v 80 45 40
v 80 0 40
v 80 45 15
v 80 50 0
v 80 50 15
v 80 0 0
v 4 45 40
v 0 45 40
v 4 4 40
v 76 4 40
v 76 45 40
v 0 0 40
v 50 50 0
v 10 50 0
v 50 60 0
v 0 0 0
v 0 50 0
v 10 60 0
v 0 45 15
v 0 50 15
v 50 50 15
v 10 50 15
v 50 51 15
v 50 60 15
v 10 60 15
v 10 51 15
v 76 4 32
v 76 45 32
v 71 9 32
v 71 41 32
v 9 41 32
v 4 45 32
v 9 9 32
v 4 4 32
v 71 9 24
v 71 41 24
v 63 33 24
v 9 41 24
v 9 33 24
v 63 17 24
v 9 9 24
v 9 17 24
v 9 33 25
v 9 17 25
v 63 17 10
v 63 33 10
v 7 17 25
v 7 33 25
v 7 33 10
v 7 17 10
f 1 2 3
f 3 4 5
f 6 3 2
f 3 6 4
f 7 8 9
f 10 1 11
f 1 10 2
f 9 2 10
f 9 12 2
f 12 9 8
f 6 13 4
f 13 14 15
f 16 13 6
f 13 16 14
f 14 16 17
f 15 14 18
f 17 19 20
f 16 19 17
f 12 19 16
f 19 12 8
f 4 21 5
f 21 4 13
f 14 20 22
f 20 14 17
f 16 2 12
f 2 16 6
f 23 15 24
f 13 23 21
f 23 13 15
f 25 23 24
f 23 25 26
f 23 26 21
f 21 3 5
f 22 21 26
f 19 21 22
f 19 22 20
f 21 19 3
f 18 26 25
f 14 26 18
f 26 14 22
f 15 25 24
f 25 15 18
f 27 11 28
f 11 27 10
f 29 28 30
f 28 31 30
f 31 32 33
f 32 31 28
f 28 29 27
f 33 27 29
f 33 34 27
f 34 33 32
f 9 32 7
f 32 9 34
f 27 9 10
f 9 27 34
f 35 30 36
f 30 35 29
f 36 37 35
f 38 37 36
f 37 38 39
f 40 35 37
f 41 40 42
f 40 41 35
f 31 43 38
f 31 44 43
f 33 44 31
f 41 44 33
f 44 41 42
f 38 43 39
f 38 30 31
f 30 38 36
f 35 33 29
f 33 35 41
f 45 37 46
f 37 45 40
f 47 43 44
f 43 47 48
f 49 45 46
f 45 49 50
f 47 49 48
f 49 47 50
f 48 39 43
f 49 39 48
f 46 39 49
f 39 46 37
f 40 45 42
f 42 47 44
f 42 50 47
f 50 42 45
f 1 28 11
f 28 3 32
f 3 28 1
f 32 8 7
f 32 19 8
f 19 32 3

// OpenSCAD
// ============================================================
// Stepped-Cavity Housing with Side Projection
// ============================================================

// ---- Global resolution ----
$fn = 64;

// ---- Main body dimensions (mm) ----
body_length   = 80;   // X size
body_width    = 50;   // Y size
body_height   = 40;   // Z size

// ---- Upper recess (broad pocket under the rim) ----
rim_width     = 4;    // thin rim surrounding the upper recess
recess1_depth = 8;    // depth of the broad upper recess
recess1_inset = rim_width;

// ---- Second (smaller inset) pocket ----
recess2_extra = 5;    // additional inset beyond recess 1 on each side
recess2_depth = 8;    // depth below the first recess floor

// ---- Deepest pocket (shifted to one side) ----
pocket_shift   = 10;  // shift of deepest pocket toward -X side
pocket_inset   = 8;   // inset of deepest pocket from recess 2 walls
pocket_depth   = 14;  // depth below the second recess floor
floor_thick    = 5;   // solid bottom thickness remaining

// ---- Side projection (boss along one side) ----
proj_height   = 15;   // height of the added side projection
proj_thickness= 10;   // how far it projects outward in +Y
proj_length   = 40;   // length of the projection along X
proj_setback  = 10;   // X offset of projection start

// ---- Side recess above the projection ----
side_recess_depth = 5;   // cut depth into the +Y face
side_recess_height = body_height - proj_height; // height of recessed tier

// ============================================================
// Modules
// ============================================================

// Main body blank
module body_blank() {
    cube([body_length, body_width, body_height]);
}

// Nested stepped cavity cut from the top (no through opening)
module stepped_cavity() {
    // Tier 1: broad upper recess bounded by the thin rim
    translate([recess1_inset, recess1_inset, body_height - recess1_depth])
        cube([body_length - 2*recess1_inset,
              body_width  - 2*recess1_inset,
              recess1_depth + 1]);          // +1 ensures clean top face cut

    // Tier 2: smaller inset rectangular cut continuing downward
    translate([recess1_inset + recess2_extra,
               recess1_inset + recess2_extra,
               body_height - recess1_depth - recess2_depth])
        cube([body_length - 2*(recess1_inset + recess2_extra),
              body_width  - 2*(recess1_inset + recess2_extra),
              recess2_depth + 1]);

    // Tier 3: deepest pocket, shifted to one side (-X)
    translate([recess1_inset + recess2_extra + pocket_inset - pocket_shift,
               recess1_inset + recess2_extra + pocket_inset,
               body_height - recess1_depth - recess2_depth - pocket_depth])
        cube([body_length - 2*(recess1_inset + recess2_extra + pocket_inset) + pocket_shift,
              body_width  - 2*(recess1_inset + recess2_extra + pocket_inset),
              pocket_depth + 1]);
}

// Added rectangular solid projection along the +Y side
module side_projection() {
    translate([proj_setback, body_width, 0])
        cube([proj_length, proj_thickness, proj_height]);
}

// Shallow recess cut into the +Y face above the projection,
// creating a stepped exterior tier
module side_recess() {
    translate([-1, body_width - side_recess_depth, proj_height])
        cube([body_length + 2, side_recess_depth + 1, side_recess_height]);
}

// ============================================================
// Assembly
// ============================================================

difference() {
    union() {
        // Main body plus the single side projection
        body_blank();
        side_projection();
    }
    // Top-down stepped cavity (leaves a solid bottom)
    stepped_cavity();
    // Stepped side recess above the projection
    side_recess();
}
